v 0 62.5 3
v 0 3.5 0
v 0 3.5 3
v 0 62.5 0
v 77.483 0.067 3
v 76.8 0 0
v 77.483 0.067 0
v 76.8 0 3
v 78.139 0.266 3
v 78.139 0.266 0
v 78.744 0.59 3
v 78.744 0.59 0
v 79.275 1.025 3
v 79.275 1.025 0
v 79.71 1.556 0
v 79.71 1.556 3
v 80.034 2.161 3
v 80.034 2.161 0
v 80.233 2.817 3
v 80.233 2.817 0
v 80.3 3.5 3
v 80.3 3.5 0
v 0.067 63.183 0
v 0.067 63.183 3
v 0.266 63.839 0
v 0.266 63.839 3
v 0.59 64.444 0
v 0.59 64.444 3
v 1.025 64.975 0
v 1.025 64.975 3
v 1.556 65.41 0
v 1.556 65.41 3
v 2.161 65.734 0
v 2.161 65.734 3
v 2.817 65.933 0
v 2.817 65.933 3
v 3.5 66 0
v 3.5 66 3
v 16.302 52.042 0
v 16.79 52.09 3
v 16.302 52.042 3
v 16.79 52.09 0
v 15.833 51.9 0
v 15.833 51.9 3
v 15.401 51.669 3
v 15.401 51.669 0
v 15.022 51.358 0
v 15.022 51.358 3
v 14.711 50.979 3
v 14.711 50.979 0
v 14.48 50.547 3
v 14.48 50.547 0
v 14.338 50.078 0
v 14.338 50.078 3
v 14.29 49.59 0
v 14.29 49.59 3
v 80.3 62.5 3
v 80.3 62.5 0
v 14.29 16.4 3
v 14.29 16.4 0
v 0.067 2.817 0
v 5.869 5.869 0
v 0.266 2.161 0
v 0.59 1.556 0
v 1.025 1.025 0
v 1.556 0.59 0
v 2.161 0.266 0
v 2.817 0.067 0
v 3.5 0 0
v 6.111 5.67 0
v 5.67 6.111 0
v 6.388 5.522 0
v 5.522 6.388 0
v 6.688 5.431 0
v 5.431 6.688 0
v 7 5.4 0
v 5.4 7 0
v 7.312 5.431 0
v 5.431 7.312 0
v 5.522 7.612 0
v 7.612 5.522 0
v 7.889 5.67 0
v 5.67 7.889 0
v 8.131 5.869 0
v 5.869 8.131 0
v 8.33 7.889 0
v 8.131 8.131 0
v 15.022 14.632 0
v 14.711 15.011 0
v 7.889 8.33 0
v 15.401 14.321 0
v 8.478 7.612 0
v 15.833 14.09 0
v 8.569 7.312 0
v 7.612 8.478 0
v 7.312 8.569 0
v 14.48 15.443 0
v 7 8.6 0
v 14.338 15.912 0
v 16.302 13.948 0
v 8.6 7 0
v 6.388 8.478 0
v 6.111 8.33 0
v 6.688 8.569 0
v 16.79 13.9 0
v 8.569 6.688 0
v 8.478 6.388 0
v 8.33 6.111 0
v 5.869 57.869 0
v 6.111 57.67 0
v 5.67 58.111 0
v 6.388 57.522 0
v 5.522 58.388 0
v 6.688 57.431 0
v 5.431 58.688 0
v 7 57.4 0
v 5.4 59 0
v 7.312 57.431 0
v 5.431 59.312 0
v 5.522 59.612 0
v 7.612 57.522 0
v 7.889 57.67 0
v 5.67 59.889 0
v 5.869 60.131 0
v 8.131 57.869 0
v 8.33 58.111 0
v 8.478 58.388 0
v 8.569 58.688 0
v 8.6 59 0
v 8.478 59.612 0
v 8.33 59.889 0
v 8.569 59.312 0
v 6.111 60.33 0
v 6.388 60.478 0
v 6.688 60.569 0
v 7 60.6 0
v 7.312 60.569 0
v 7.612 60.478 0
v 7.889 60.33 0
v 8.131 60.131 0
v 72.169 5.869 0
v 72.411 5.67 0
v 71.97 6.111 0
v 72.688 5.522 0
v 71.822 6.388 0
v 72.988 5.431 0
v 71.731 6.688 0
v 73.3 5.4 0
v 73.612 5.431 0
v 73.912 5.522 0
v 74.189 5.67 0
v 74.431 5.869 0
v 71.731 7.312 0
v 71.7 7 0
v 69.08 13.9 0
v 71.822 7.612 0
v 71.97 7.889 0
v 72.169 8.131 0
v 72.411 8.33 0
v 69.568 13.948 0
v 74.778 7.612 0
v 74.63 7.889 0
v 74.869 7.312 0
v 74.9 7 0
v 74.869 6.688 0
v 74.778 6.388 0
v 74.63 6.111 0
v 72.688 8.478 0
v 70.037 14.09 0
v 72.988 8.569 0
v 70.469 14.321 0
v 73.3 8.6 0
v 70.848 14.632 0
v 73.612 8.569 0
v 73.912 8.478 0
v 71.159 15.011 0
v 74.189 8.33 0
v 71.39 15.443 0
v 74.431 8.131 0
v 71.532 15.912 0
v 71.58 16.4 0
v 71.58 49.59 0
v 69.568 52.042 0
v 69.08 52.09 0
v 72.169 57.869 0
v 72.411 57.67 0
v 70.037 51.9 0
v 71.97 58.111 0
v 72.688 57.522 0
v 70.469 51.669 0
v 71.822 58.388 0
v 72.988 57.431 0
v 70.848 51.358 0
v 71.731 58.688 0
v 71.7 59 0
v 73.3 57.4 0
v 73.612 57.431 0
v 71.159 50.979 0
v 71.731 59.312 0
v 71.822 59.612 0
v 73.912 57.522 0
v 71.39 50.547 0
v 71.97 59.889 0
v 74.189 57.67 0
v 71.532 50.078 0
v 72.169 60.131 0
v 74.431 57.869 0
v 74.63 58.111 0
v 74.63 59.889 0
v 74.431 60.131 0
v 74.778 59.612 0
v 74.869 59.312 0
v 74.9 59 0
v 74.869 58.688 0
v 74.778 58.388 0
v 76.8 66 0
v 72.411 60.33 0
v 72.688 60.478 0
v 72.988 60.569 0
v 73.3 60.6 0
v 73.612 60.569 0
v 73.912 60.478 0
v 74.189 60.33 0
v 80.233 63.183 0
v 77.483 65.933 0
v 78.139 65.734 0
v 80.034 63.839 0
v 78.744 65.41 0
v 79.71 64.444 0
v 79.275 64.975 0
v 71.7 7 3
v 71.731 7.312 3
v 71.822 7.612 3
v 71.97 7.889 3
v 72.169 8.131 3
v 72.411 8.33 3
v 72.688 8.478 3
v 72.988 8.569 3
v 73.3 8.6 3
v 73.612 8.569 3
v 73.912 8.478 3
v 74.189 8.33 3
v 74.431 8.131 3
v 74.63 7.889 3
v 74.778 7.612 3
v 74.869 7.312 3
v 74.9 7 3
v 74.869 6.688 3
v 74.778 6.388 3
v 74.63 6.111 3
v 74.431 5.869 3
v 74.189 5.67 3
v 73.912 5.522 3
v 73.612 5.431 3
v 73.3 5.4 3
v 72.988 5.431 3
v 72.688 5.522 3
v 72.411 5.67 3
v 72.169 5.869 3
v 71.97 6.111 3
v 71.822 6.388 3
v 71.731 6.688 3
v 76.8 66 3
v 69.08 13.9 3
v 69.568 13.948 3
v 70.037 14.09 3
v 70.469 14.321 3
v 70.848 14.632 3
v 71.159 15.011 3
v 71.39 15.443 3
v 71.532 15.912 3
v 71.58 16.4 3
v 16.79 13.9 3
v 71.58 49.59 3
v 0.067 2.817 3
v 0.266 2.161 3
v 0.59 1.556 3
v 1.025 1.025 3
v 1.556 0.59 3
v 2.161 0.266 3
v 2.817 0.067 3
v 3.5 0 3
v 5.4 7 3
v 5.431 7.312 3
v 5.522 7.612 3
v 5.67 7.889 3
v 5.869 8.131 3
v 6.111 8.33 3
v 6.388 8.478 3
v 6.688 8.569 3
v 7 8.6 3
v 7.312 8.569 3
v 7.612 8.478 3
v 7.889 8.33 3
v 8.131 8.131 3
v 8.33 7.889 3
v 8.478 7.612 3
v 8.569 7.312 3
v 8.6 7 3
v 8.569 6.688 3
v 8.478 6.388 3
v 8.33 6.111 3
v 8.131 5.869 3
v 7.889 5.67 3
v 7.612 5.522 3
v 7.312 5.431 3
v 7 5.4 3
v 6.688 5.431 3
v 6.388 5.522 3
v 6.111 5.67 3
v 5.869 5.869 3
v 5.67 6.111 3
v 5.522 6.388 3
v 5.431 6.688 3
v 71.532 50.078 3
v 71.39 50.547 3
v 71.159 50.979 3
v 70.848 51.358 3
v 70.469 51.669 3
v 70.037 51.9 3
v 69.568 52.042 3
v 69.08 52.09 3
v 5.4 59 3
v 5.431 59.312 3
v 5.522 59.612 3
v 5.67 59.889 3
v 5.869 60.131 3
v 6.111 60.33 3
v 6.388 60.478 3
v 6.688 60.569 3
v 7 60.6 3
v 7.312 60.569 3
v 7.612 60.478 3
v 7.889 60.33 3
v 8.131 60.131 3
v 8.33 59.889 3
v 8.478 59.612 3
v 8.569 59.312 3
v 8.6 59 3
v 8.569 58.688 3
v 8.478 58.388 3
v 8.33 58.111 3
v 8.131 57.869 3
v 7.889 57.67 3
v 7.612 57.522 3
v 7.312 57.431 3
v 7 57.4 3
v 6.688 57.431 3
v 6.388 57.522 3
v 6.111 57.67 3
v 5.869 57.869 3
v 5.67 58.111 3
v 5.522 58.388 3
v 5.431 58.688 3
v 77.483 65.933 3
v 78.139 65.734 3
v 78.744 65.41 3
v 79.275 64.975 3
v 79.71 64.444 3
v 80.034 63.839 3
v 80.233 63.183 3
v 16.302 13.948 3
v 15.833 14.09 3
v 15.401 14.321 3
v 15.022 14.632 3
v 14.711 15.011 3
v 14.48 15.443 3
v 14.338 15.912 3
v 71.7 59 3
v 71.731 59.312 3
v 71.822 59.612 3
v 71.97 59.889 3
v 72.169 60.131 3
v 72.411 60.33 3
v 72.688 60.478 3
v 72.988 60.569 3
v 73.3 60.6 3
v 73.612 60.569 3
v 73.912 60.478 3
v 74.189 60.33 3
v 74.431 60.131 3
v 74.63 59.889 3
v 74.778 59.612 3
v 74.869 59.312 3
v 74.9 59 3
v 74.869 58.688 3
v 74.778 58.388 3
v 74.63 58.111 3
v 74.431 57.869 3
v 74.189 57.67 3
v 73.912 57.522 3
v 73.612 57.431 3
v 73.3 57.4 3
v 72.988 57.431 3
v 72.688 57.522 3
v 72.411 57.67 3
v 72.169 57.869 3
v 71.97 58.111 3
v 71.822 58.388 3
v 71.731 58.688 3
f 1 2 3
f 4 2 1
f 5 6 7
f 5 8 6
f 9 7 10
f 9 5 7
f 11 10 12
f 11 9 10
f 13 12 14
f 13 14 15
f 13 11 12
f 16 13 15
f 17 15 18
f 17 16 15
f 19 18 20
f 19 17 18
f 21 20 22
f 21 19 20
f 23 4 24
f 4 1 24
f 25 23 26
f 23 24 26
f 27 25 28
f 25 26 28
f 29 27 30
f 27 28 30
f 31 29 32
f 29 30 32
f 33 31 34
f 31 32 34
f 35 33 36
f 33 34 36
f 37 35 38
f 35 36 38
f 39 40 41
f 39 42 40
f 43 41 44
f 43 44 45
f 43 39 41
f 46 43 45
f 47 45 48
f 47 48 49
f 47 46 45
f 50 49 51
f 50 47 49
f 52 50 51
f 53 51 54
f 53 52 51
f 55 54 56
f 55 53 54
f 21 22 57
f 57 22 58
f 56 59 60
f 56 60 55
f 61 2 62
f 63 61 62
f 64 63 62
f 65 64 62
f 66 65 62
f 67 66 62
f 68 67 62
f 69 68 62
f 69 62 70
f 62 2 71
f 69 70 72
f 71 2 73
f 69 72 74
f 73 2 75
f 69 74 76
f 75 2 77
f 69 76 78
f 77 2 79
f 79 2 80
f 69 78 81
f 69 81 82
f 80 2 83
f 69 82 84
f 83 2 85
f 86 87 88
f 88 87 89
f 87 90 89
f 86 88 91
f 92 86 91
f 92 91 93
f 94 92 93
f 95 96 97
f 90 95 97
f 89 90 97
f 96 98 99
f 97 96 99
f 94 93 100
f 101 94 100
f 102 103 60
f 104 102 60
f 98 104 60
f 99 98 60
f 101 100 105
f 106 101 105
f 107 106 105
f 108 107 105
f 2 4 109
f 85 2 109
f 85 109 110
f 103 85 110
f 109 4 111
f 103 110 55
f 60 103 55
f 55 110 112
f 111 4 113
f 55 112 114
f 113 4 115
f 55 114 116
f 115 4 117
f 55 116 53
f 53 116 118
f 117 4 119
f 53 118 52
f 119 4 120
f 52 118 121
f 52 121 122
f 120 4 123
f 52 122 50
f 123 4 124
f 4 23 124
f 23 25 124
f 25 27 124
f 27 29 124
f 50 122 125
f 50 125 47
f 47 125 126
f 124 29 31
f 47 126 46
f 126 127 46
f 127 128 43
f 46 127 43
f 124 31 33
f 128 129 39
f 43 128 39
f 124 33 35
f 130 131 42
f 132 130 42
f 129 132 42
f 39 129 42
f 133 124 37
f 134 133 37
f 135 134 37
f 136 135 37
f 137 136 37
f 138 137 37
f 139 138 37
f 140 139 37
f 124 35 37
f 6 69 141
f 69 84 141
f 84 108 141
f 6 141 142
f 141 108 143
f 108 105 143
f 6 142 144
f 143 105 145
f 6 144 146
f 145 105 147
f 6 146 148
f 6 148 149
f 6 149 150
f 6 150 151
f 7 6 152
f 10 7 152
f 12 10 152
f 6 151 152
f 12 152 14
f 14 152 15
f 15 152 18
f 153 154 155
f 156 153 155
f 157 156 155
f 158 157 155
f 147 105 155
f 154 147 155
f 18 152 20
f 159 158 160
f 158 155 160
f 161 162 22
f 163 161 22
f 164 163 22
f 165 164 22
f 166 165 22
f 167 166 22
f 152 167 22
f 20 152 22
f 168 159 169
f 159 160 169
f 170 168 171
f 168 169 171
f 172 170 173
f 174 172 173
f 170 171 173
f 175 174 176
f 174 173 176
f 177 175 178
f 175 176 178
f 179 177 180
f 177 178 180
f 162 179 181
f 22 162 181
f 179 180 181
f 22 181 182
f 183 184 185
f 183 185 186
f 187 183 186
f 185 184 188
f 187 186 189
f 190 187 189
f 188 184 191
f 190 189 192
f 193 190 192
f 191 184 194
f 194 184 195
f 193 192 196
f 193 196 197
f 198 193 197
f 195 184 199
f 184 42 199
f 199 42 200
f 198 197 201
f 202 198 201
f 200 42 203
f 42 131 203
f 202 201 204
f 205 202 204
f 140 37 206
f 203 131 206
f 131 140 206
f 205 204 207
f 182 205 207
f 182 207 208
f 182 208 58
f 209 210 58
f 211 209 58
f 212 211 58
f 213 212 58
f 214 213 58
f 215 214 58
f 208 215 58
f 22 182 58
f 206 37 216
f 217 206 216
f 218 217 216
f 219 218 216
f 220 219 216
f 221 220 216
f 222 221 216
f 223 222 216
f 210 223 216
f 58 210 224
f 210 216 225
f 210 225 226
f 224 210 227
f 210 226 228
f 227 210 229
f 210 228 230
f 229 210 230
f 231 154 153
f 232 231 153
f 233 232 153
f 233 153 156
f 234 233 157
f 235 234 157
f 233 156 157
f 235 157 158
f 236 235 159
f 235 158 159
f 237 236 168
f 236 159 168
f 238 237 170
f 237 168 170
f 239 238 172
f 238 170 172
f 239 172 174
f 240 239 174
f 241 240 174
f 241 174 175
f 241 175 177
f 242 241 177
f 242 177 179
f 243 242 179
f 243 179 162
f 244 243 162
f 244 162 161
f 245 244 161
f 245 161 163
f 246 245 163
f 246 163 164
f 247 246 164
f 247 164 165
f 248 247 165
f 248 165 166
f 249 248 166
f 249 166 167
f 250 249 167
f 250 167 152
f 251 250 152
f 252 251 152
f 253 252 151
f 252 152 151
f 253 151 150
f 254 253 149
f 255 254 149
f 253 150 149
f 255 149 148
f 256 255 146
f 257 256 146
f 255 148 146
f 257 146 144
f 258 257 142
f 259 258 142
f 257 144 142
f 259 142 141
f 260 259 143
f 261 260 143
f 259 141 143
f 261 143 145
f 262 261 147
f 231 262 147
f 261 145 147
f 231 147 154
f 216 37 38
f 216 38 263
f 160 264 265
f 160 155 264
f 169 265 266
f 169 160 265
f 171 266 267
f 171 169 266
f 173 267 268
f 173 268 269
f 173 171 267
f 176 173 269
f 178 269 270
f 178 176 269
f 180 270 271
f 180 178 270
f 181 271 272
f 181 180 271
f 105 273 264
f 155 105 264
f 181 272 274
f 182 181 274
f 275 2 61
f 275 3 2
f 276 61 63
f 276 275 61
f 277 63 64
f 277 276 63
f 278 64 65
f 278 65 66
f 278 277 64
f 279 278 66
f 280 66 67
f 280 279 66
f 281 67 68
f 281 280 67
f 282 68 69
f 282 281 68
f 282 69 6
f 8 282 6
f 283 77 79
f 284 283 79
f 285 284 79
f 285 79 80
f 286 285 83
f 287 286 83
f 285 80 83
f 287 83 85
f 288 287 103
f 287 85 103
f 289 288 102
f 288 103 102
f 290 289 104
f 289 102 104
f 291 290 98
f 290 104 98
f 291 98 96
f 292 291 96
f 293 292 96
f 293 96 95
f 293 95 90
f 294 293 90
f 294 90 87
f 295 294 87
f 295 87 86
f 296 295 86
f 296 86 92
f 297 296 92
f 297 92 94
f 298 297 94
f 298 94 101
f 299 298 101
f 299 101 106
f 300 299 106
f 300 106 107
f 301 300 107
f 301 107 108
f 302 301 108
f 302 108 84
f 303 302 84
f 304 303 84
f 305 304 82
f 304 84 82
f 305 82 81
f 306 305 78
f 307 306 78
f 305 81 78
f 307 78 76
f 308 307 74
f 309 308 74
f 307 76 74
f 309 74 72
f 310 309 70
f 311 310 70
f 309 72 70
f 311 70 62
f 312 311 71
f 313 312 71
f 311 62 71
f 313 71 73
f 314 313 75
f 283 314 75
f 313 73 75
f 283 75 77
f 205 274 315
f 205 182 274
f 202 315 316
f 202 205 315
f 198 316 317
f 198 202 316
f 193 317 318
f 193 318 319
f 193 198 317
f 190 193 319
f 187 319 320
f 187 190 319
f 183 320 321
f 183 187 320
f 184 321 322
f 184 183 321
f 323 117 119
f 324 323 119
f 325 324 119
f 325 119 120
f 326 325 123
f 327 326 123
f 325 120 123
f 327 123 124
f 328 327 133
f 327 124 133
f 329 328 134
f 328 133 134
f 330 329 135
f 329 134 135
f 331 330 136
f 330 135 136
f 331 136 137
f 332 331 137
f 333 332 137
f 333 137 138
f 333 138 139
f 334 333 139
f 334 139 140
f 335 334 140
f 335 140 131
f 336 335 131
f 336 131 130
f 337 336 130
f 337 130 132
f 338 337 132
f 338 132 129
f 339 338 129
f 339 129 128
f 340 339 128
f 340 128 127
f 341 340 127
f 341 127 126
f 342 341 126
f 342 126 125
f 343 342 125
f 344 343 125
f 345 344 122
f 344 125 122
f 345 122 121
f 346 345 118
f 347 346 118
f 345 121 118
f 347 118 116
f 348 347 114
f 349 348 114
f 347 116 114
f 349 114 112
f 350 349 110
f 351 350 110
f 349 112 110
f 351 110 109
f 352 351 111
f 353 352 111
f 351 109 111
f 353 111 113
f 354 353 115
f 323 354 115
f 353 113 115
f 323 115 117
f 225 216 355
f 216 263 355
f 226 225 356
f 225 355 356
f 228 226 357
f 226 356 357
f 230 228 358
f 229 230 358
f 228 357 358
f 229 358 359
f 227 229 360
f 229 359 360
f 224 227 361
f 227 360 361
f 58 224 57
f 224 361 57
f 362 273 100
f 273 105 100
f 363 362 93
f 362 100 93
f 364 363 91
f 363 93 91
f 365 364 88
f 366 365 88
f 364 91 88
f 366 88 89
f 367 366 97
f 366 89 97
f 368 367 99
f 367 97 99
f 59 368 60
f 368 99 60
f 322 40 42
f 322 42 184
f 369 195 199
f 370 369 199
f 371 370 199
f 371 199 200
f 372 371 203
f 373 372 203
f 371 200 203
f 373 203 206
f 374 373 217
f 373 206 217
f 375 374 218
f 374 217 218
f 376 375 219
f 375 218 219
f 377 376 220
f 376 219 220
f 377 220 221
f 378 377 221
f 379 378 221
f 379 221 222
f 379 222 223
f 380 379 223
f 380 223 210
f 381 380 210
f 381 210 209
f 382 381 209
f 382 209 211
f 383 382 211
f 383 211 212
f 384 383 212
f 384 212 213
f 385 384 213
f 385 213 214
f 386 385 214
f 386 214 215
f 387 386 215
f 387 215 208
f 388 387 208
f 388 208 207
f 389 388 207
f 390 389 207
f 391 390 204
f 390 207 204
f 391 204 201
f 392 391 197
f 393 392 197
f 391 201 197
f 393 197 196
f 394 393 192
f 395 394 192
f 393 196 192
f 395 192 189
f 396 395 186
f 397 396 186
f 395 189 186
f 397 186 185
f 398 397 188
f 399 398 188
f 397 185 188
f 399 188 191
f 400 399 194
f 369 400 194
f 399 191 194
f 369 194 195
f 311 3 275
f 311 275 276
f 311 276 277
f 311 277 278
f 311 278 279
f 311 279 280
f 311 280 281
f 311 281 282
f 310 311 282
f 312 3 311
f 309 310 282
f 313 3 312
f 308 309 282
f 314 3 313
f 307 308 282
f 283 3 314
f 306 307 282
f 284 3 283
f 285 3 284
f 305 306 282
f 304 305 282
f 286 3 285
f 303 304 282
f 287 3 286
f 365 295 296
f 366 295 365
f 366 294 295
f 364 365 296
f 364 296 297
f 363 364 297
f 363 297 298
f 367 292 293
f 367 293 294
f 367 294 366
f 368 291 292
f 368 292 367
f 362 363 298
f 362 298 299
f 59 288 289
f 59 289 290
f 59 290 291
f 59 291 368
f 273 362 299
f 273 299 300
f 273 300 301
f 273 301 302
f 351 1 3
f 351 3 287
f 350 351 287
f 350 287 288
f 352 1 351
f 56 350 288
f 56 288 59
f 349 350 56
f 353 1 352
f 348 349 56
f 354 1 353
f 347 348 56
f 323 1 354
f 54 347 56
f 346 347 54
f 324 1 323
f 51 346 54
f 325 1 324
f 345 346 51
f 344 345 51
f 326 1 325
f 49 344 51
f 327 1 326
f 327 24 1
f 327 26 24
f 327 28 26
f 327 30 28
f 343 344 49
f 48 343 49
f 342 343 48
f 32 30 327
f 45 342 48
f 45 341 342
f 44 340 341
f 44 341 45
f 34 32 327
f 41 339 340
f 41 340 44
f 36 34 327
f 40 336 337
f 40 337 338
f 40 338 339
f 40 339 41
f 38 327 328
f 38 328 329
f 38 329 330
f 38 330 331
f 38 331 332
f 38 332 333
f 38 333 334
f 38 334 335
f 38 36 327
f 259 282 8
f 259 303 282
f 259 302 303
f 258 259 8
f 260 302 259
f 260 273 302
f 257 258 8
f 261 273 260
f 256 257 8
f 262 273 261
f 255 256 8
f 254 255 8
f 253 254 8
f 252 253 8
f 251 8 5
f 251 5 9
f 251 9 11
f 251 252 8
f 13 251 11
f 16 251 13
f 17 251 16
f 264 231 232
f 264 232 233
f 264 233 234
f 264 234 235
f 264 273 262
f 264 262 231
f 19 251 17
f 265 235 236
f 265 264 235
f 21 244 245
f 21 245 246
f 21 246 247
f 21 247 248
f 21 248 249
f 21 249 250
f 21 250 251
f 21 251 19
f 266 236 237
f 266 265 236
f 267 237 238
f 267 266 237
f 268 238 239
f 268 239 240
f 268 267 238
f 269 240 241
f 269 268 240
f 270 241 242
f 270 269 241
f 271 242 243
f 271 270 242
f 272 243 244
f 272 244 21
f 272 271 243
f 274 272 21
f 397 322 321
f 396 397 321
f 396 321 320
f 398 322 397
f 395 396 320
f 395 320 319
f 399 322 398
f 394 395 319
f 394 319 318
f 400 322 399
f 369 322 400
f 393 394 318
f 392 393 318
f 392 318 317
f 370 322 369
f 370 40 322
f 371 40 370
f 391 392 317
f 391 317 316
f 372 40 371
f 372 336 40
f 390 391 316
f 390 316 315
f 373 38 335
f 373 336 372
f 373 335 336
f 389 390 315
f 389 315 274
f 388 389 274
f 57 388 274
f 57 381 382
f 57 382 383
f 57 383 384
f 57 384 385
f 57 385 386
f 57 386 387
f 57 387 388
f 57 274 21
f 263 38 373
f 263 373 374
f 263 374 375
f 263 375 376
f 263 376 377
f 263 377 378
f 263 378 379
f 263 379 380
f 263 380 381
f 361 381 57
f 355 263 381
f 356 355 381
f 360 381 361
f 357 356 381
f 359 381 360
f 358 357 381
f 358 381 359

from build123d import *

# Parameters (mm, degrees)
SKETCH1_W                  = 80.3
SKETCH1_H                  = 66
BOSS_EXTRUDE1_DEPTH        = 3
F_3_2_3_2_DIAMETER_HOLE1_D = 3.2
SKETCH2_W                  = 57.29
SKETCH2_H                  = 38.19
CUT_EXTRUDE1_DEPTH         = 4
FILLET1_R                  = 3.5
FILLET2_R                  = 2.5


with BuildPart() as part:
    # Sketch1 → Boss-Extrude1 (new body)
    with BuildSketch(Plane.XY):
        with Locations((40.15, 33)):
            Rectangle(SKETCH1_W, SKETCH1_H)
    extrude(amount=BOSS_EXTRUDE1_DEPTH)

    # Ø3.2 (3.2) Diameter Hole1 (through all)
    with Locations(Plane.XY.offset(3)):
        with Locations((7, 59), (73.3, 59), (73.3, 7), (7, 7)):
            Hole(F_3_2_3_2_DIAMETER_HOLE1_D / 2)

    # Sketch2 → Cut-Extrude1 (cut, through all)
    with BuildSketch(Plane.XY.offset(3)):
        with Locations((42.935, 32.995)):
            Rectangle(SKETCH2_W, SKETCH2_H)
    extrude(amount=-CUT_EXTRUDE1_DEPTH, mode=Mode.SUBTRACT)

    # Fillet1
    fillet1_edges = [part.edges().sort_by_distance(p)[0] for p in [
        (0, 66, 1.5),
        (80.3, 66, 1.5),
        (80.3, 0, 1.5),
        (0, 0, 1.5),
    ]]
    fillet(fillet1_edges, radius=FILLET1_R)

    # Fillet2
    fillet2_edges = [part.edges().sort_by_distance(p)[0] for p in [
        (14.29, 13.9, 1.5),
        (14.29, 52.09, 1.5),
        (71.58, 52.09, 1.5),
        (71.58, 13.9, 1.5),
    ]]
    fillet(fillet2_edges, radius=FILLET2_R)


solid = part.part
